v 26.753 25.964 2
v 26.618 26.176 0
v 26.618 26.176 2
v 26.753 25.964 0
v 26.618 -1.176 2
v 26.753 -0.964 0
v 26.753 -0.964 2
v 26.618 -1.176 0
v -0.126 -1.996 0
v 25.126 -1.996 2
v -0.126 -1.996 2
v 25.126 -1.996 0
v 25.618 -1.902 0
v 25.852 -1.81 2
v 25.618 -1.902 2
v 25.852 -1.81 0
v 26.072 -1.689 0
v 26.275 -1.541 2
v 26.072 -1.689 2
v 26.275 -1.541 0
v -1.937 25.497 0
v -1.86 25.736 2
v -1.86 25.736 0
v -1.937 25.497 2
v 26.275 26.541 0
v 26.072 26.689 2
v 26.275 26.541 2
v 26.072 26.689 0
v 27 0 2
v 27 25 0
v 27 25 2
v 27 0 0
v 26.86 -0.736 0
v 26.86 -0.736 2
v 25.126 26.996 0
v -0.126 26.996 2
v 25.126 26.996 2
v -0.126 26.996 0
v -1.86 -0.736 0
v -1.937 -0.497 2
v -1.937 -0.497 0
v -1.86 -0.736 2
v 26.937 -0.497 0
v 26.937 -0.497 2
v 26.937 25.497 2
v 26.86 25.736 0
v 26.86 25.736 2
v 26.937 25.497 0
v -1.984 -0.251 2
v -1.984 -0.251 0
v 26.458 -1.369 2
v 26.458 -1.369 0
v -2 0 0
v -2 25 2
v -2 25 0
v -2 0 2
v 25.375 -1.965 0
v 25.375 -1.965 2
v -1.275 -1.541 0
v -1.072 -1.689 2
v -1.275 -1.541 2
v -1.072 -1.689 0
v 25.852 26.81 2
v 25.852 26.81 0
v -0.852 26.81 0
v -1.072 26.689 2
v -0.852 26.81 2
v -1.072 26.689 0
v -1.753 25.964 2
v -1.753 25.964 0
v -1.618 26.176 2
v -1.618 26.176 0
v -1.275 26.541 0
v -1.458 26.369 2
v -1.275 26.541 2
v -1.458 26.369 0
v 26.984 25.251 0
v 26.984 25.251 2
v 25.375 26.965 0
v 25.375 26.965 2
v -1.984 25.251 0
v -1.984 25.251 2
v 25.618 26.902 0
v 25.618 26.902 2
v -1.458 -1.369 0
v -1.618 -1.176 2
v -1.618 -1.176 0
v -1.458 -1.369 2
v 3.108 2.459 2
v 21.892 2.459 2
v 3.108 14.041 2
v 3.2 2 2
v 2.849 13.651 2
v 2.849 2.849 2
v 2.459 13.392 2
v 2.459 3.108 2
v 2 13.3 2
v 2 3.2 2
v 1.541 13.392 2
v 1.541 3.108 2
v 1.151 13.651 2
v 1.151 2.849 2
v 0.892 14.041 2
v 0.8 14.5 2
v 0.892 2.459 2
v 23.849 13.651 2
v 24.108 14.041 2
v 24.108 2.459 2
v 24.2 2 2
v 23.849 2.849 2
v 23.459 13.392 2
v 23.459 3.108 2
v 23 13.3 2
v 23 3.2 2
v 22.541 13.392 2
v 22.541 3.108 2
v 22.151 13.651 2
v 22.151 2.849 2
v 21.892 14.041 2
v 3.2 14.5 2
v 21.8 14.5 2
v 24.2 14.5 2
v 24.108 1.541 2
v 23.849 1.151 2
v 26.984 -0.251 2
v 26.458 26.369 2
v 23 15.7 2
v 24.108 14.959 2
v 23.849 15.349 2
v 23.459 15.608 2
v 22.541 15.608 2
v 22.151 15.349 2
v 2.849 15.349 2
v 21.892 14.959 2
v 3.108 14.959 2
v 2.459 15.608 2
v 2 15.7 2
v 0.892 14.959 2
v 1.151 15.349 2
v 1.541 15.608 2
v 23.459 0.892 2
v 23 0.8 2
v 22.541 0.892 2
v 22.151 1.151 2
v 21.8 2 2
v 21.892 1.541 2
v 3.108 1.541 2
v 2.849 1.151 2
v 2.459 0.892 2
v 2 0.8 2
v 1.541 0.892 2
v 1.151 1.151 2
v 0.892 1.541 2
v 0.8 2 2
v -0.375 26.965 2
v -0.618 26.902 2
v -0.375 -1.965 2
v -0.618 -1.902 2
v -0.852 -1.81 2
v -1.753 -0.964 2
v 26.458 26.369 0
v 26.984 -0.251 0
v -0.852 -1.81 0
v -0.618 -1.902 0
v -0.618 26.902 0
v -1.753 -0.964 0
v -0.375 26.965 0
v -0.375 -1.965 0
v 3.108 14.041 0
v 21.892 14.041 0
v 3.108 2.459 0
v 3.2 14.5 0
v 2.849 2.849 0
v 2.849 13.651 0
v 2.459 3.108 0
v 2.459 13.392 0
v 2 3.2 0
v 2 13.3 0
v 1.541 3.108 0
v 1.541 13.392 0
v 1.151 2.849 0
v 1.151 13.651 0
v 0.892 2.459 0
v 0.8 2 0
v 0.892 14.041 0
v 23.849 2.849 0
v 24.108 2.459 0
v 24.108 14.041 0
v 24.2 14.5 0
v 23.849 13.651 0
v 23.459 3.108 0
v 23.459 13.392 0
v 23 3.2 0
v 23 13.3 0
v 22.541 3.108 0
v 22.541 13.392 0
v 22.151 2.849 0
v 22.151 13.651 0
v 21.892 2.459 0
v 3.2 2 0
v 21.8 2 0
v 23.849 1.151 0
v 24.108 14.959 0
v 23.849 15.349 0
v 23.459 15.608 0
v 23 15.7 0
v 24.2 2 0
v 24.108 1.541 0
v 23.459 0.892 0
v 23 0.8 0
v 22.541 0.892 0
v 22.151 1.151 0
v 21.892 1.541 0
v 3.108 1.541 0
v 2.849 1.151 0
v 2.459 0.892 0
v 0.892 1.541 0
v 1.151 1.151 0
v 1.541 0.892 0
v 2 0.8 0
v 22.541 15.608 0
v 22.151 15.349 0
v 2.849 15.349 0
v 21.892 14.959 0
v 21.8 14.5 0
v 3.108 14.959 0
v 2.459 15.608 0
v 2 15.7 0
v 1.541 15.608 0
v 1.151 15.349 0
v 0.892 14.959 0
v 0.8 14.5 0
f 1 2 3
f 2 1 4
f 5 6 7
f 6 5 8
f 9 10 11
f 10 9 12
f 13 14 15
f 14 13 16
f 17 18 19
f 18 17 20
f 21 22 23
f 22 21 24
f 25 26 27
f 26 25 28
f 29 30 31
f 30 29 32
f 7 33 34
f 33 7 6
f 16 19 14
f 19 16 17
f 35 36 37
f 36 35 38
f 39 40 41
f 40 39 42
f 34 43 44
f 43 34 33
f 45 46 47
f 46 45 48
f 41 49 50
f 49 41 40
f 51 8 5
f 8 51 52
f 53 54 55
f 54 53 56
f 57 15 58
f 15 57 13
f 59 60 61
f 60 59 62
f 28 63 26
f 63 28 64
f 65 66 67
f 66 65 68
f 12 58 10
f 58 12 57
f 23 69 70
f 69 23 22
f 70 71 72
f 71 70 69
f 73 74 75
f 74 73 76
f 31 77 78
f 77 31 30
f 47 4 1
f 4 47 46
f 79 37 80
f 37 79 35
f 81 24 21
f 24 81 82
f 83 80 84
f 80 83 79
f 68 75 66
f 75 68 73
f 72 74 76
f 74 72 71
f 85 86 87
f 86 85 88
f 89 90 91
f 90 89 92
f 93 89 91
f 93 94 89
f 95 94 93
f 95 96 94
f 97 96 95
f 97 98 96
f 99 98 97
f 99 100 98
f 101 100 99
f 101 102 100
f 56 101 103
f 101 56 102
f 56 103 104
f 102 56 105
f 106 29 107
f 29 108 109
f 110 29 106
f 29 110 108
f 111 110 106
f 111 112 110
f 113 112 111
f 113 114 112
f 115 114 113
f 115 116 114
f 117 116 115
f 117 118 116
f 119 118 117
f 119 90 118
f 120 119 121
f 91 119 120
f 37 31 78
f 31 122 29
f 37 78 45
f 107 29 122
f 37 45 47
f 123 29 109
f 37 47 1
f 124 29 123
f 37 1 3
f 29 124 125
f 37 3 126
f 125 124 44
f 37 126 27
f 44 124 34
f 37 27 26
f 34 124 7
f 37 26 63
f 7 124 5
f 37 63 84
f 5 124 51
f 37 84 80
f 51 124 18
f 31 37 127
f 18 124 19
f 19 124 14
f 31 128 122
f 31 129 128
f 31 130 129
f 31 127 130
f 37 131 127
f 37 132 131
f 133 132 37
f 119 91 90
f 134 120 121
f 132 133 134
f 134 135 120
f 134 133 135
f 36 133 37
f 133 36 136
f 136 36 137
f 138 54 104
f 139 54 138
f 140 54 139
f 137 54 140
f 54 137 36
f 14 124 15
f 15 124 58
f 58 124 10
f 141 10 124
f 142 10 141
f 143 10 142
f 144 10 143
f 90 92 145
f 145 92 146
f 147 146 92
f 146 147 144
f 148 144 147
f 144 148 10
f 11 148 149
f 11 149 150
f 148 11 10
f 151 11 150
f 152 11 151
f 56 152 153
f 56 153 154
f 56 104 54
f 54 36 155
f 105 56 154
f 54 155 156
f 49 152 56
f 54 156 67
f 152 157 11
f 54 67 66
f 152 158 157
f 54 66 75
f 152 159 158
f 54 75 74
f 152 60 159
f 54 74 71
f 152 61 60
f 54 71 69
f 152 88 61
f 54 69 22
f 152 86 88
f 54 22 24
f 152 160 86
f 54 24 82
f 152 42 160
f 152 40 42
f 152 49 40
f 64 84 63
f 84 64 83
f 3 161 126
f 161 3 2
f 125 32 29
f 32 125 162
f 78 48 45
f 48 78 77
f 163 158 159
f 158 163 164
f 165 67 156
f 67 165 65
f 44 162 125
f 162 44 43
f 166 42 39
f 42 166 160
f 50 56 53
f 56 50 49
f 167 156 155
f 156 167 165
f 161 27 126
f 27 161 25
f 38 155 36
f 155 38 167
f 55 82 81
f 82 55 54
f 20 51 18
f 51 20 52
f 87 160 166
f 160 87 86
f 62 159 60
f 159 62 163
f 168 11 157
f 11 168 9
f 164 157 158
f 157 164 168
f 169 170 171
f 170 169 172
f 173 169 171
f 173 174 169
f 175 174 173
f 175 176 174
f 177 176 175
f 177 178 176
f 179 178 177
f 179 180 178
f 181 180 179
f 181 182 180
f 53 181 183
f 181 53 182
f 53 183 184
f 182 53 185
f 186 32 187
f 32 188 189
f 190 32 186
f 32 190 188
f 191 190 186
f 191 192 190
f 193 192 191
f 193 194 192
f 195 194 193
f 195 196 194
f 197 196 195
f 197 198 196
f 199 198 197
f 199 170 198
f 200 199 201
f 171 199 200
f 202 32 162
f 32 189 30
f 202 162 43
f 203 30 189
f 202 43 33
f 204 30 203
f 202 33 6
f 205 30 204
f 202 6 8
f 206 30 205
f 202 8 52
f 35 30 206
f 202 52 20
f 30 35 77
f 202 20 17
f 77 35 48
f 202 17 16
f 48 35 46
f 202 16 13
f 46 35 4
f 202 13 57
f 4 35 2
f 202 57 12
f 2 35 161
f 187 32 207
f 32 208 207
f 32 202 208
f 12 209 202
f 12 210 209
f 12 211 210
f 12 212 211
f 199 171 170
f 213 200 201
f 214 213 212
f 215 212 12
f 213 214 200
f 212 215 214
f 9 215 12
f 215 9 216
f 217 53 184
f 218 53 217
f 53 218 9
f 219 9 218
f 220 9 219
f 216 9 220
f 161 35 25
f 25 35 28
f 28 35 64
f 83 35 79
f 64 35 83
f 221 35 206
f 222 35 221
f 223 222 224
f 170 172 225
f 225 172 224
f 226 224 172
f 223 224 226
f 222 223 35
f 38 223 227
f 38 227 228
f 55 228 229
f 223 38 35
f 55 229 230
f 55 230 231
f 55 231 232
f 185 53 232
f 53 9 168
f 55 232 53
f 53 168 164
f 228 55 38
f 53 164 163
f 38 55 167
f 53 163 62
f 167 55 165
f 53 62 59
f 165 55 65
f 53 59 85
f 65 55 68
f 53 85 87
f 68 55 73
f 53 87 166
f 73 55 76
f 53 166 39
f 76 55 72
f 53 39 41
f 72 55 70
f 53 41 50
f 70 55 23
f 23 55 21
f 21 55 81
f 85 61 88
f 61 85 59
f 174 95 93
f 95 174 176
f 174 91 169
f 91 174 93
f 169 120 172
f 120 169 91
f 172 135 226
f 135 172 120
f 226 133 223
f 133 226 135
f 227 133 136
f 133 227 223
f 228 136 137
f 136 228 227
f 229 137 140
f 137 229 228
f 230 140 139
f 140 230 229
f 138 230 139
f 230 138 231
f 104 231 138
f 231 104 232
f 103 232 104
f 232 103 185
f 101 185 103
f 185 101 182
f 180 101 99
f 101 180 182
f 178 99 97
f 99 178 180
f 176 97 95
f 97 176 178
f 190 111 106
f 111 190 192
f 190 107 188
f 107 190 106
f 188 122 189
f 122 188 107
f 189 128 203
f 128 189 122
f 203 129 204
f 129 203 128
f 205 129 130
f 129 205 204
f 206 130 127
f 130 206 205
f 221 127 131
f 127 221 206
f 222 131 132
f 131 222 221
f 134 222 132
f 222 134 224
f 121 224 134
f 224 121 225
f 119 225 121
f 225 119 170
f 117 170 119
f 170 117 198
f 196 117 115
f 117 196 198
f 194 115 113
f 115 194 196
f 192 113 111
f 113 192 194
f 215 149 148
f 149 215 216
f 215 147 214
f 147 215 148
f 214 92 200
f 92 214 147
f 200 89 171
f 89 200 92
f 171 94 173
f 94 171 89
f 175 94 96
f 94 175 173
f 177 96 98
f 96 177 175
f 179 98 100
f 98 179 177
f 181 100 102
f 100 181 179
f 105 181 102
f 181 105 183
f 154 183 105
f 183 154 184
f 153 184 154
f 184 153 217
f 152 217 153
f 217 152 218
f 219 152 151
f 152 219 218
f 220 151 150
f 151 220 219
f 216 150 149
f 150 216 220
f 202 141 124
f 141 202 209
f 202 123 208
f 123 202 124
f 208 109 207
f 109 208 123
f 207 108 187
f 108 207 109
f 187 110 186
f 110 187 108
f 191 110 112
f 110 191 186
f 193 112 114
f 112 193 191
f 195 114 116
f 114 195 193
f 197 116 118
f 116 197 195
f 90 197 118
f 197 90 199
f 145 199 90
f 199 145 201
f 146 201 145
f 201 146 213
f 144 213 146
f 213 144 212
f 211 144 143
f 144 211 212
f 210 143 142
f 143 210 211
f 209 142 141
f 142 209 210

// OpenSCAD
//Cam V1_3
$fn=50;
difference(){
minkowski()
{
  cube([25,25,1]);
  cylinder(r=2,h=1);
}

linear_extrude(10)
import("../dxf/Cam_V1_3_holes.dxf", $fn=16);
}
